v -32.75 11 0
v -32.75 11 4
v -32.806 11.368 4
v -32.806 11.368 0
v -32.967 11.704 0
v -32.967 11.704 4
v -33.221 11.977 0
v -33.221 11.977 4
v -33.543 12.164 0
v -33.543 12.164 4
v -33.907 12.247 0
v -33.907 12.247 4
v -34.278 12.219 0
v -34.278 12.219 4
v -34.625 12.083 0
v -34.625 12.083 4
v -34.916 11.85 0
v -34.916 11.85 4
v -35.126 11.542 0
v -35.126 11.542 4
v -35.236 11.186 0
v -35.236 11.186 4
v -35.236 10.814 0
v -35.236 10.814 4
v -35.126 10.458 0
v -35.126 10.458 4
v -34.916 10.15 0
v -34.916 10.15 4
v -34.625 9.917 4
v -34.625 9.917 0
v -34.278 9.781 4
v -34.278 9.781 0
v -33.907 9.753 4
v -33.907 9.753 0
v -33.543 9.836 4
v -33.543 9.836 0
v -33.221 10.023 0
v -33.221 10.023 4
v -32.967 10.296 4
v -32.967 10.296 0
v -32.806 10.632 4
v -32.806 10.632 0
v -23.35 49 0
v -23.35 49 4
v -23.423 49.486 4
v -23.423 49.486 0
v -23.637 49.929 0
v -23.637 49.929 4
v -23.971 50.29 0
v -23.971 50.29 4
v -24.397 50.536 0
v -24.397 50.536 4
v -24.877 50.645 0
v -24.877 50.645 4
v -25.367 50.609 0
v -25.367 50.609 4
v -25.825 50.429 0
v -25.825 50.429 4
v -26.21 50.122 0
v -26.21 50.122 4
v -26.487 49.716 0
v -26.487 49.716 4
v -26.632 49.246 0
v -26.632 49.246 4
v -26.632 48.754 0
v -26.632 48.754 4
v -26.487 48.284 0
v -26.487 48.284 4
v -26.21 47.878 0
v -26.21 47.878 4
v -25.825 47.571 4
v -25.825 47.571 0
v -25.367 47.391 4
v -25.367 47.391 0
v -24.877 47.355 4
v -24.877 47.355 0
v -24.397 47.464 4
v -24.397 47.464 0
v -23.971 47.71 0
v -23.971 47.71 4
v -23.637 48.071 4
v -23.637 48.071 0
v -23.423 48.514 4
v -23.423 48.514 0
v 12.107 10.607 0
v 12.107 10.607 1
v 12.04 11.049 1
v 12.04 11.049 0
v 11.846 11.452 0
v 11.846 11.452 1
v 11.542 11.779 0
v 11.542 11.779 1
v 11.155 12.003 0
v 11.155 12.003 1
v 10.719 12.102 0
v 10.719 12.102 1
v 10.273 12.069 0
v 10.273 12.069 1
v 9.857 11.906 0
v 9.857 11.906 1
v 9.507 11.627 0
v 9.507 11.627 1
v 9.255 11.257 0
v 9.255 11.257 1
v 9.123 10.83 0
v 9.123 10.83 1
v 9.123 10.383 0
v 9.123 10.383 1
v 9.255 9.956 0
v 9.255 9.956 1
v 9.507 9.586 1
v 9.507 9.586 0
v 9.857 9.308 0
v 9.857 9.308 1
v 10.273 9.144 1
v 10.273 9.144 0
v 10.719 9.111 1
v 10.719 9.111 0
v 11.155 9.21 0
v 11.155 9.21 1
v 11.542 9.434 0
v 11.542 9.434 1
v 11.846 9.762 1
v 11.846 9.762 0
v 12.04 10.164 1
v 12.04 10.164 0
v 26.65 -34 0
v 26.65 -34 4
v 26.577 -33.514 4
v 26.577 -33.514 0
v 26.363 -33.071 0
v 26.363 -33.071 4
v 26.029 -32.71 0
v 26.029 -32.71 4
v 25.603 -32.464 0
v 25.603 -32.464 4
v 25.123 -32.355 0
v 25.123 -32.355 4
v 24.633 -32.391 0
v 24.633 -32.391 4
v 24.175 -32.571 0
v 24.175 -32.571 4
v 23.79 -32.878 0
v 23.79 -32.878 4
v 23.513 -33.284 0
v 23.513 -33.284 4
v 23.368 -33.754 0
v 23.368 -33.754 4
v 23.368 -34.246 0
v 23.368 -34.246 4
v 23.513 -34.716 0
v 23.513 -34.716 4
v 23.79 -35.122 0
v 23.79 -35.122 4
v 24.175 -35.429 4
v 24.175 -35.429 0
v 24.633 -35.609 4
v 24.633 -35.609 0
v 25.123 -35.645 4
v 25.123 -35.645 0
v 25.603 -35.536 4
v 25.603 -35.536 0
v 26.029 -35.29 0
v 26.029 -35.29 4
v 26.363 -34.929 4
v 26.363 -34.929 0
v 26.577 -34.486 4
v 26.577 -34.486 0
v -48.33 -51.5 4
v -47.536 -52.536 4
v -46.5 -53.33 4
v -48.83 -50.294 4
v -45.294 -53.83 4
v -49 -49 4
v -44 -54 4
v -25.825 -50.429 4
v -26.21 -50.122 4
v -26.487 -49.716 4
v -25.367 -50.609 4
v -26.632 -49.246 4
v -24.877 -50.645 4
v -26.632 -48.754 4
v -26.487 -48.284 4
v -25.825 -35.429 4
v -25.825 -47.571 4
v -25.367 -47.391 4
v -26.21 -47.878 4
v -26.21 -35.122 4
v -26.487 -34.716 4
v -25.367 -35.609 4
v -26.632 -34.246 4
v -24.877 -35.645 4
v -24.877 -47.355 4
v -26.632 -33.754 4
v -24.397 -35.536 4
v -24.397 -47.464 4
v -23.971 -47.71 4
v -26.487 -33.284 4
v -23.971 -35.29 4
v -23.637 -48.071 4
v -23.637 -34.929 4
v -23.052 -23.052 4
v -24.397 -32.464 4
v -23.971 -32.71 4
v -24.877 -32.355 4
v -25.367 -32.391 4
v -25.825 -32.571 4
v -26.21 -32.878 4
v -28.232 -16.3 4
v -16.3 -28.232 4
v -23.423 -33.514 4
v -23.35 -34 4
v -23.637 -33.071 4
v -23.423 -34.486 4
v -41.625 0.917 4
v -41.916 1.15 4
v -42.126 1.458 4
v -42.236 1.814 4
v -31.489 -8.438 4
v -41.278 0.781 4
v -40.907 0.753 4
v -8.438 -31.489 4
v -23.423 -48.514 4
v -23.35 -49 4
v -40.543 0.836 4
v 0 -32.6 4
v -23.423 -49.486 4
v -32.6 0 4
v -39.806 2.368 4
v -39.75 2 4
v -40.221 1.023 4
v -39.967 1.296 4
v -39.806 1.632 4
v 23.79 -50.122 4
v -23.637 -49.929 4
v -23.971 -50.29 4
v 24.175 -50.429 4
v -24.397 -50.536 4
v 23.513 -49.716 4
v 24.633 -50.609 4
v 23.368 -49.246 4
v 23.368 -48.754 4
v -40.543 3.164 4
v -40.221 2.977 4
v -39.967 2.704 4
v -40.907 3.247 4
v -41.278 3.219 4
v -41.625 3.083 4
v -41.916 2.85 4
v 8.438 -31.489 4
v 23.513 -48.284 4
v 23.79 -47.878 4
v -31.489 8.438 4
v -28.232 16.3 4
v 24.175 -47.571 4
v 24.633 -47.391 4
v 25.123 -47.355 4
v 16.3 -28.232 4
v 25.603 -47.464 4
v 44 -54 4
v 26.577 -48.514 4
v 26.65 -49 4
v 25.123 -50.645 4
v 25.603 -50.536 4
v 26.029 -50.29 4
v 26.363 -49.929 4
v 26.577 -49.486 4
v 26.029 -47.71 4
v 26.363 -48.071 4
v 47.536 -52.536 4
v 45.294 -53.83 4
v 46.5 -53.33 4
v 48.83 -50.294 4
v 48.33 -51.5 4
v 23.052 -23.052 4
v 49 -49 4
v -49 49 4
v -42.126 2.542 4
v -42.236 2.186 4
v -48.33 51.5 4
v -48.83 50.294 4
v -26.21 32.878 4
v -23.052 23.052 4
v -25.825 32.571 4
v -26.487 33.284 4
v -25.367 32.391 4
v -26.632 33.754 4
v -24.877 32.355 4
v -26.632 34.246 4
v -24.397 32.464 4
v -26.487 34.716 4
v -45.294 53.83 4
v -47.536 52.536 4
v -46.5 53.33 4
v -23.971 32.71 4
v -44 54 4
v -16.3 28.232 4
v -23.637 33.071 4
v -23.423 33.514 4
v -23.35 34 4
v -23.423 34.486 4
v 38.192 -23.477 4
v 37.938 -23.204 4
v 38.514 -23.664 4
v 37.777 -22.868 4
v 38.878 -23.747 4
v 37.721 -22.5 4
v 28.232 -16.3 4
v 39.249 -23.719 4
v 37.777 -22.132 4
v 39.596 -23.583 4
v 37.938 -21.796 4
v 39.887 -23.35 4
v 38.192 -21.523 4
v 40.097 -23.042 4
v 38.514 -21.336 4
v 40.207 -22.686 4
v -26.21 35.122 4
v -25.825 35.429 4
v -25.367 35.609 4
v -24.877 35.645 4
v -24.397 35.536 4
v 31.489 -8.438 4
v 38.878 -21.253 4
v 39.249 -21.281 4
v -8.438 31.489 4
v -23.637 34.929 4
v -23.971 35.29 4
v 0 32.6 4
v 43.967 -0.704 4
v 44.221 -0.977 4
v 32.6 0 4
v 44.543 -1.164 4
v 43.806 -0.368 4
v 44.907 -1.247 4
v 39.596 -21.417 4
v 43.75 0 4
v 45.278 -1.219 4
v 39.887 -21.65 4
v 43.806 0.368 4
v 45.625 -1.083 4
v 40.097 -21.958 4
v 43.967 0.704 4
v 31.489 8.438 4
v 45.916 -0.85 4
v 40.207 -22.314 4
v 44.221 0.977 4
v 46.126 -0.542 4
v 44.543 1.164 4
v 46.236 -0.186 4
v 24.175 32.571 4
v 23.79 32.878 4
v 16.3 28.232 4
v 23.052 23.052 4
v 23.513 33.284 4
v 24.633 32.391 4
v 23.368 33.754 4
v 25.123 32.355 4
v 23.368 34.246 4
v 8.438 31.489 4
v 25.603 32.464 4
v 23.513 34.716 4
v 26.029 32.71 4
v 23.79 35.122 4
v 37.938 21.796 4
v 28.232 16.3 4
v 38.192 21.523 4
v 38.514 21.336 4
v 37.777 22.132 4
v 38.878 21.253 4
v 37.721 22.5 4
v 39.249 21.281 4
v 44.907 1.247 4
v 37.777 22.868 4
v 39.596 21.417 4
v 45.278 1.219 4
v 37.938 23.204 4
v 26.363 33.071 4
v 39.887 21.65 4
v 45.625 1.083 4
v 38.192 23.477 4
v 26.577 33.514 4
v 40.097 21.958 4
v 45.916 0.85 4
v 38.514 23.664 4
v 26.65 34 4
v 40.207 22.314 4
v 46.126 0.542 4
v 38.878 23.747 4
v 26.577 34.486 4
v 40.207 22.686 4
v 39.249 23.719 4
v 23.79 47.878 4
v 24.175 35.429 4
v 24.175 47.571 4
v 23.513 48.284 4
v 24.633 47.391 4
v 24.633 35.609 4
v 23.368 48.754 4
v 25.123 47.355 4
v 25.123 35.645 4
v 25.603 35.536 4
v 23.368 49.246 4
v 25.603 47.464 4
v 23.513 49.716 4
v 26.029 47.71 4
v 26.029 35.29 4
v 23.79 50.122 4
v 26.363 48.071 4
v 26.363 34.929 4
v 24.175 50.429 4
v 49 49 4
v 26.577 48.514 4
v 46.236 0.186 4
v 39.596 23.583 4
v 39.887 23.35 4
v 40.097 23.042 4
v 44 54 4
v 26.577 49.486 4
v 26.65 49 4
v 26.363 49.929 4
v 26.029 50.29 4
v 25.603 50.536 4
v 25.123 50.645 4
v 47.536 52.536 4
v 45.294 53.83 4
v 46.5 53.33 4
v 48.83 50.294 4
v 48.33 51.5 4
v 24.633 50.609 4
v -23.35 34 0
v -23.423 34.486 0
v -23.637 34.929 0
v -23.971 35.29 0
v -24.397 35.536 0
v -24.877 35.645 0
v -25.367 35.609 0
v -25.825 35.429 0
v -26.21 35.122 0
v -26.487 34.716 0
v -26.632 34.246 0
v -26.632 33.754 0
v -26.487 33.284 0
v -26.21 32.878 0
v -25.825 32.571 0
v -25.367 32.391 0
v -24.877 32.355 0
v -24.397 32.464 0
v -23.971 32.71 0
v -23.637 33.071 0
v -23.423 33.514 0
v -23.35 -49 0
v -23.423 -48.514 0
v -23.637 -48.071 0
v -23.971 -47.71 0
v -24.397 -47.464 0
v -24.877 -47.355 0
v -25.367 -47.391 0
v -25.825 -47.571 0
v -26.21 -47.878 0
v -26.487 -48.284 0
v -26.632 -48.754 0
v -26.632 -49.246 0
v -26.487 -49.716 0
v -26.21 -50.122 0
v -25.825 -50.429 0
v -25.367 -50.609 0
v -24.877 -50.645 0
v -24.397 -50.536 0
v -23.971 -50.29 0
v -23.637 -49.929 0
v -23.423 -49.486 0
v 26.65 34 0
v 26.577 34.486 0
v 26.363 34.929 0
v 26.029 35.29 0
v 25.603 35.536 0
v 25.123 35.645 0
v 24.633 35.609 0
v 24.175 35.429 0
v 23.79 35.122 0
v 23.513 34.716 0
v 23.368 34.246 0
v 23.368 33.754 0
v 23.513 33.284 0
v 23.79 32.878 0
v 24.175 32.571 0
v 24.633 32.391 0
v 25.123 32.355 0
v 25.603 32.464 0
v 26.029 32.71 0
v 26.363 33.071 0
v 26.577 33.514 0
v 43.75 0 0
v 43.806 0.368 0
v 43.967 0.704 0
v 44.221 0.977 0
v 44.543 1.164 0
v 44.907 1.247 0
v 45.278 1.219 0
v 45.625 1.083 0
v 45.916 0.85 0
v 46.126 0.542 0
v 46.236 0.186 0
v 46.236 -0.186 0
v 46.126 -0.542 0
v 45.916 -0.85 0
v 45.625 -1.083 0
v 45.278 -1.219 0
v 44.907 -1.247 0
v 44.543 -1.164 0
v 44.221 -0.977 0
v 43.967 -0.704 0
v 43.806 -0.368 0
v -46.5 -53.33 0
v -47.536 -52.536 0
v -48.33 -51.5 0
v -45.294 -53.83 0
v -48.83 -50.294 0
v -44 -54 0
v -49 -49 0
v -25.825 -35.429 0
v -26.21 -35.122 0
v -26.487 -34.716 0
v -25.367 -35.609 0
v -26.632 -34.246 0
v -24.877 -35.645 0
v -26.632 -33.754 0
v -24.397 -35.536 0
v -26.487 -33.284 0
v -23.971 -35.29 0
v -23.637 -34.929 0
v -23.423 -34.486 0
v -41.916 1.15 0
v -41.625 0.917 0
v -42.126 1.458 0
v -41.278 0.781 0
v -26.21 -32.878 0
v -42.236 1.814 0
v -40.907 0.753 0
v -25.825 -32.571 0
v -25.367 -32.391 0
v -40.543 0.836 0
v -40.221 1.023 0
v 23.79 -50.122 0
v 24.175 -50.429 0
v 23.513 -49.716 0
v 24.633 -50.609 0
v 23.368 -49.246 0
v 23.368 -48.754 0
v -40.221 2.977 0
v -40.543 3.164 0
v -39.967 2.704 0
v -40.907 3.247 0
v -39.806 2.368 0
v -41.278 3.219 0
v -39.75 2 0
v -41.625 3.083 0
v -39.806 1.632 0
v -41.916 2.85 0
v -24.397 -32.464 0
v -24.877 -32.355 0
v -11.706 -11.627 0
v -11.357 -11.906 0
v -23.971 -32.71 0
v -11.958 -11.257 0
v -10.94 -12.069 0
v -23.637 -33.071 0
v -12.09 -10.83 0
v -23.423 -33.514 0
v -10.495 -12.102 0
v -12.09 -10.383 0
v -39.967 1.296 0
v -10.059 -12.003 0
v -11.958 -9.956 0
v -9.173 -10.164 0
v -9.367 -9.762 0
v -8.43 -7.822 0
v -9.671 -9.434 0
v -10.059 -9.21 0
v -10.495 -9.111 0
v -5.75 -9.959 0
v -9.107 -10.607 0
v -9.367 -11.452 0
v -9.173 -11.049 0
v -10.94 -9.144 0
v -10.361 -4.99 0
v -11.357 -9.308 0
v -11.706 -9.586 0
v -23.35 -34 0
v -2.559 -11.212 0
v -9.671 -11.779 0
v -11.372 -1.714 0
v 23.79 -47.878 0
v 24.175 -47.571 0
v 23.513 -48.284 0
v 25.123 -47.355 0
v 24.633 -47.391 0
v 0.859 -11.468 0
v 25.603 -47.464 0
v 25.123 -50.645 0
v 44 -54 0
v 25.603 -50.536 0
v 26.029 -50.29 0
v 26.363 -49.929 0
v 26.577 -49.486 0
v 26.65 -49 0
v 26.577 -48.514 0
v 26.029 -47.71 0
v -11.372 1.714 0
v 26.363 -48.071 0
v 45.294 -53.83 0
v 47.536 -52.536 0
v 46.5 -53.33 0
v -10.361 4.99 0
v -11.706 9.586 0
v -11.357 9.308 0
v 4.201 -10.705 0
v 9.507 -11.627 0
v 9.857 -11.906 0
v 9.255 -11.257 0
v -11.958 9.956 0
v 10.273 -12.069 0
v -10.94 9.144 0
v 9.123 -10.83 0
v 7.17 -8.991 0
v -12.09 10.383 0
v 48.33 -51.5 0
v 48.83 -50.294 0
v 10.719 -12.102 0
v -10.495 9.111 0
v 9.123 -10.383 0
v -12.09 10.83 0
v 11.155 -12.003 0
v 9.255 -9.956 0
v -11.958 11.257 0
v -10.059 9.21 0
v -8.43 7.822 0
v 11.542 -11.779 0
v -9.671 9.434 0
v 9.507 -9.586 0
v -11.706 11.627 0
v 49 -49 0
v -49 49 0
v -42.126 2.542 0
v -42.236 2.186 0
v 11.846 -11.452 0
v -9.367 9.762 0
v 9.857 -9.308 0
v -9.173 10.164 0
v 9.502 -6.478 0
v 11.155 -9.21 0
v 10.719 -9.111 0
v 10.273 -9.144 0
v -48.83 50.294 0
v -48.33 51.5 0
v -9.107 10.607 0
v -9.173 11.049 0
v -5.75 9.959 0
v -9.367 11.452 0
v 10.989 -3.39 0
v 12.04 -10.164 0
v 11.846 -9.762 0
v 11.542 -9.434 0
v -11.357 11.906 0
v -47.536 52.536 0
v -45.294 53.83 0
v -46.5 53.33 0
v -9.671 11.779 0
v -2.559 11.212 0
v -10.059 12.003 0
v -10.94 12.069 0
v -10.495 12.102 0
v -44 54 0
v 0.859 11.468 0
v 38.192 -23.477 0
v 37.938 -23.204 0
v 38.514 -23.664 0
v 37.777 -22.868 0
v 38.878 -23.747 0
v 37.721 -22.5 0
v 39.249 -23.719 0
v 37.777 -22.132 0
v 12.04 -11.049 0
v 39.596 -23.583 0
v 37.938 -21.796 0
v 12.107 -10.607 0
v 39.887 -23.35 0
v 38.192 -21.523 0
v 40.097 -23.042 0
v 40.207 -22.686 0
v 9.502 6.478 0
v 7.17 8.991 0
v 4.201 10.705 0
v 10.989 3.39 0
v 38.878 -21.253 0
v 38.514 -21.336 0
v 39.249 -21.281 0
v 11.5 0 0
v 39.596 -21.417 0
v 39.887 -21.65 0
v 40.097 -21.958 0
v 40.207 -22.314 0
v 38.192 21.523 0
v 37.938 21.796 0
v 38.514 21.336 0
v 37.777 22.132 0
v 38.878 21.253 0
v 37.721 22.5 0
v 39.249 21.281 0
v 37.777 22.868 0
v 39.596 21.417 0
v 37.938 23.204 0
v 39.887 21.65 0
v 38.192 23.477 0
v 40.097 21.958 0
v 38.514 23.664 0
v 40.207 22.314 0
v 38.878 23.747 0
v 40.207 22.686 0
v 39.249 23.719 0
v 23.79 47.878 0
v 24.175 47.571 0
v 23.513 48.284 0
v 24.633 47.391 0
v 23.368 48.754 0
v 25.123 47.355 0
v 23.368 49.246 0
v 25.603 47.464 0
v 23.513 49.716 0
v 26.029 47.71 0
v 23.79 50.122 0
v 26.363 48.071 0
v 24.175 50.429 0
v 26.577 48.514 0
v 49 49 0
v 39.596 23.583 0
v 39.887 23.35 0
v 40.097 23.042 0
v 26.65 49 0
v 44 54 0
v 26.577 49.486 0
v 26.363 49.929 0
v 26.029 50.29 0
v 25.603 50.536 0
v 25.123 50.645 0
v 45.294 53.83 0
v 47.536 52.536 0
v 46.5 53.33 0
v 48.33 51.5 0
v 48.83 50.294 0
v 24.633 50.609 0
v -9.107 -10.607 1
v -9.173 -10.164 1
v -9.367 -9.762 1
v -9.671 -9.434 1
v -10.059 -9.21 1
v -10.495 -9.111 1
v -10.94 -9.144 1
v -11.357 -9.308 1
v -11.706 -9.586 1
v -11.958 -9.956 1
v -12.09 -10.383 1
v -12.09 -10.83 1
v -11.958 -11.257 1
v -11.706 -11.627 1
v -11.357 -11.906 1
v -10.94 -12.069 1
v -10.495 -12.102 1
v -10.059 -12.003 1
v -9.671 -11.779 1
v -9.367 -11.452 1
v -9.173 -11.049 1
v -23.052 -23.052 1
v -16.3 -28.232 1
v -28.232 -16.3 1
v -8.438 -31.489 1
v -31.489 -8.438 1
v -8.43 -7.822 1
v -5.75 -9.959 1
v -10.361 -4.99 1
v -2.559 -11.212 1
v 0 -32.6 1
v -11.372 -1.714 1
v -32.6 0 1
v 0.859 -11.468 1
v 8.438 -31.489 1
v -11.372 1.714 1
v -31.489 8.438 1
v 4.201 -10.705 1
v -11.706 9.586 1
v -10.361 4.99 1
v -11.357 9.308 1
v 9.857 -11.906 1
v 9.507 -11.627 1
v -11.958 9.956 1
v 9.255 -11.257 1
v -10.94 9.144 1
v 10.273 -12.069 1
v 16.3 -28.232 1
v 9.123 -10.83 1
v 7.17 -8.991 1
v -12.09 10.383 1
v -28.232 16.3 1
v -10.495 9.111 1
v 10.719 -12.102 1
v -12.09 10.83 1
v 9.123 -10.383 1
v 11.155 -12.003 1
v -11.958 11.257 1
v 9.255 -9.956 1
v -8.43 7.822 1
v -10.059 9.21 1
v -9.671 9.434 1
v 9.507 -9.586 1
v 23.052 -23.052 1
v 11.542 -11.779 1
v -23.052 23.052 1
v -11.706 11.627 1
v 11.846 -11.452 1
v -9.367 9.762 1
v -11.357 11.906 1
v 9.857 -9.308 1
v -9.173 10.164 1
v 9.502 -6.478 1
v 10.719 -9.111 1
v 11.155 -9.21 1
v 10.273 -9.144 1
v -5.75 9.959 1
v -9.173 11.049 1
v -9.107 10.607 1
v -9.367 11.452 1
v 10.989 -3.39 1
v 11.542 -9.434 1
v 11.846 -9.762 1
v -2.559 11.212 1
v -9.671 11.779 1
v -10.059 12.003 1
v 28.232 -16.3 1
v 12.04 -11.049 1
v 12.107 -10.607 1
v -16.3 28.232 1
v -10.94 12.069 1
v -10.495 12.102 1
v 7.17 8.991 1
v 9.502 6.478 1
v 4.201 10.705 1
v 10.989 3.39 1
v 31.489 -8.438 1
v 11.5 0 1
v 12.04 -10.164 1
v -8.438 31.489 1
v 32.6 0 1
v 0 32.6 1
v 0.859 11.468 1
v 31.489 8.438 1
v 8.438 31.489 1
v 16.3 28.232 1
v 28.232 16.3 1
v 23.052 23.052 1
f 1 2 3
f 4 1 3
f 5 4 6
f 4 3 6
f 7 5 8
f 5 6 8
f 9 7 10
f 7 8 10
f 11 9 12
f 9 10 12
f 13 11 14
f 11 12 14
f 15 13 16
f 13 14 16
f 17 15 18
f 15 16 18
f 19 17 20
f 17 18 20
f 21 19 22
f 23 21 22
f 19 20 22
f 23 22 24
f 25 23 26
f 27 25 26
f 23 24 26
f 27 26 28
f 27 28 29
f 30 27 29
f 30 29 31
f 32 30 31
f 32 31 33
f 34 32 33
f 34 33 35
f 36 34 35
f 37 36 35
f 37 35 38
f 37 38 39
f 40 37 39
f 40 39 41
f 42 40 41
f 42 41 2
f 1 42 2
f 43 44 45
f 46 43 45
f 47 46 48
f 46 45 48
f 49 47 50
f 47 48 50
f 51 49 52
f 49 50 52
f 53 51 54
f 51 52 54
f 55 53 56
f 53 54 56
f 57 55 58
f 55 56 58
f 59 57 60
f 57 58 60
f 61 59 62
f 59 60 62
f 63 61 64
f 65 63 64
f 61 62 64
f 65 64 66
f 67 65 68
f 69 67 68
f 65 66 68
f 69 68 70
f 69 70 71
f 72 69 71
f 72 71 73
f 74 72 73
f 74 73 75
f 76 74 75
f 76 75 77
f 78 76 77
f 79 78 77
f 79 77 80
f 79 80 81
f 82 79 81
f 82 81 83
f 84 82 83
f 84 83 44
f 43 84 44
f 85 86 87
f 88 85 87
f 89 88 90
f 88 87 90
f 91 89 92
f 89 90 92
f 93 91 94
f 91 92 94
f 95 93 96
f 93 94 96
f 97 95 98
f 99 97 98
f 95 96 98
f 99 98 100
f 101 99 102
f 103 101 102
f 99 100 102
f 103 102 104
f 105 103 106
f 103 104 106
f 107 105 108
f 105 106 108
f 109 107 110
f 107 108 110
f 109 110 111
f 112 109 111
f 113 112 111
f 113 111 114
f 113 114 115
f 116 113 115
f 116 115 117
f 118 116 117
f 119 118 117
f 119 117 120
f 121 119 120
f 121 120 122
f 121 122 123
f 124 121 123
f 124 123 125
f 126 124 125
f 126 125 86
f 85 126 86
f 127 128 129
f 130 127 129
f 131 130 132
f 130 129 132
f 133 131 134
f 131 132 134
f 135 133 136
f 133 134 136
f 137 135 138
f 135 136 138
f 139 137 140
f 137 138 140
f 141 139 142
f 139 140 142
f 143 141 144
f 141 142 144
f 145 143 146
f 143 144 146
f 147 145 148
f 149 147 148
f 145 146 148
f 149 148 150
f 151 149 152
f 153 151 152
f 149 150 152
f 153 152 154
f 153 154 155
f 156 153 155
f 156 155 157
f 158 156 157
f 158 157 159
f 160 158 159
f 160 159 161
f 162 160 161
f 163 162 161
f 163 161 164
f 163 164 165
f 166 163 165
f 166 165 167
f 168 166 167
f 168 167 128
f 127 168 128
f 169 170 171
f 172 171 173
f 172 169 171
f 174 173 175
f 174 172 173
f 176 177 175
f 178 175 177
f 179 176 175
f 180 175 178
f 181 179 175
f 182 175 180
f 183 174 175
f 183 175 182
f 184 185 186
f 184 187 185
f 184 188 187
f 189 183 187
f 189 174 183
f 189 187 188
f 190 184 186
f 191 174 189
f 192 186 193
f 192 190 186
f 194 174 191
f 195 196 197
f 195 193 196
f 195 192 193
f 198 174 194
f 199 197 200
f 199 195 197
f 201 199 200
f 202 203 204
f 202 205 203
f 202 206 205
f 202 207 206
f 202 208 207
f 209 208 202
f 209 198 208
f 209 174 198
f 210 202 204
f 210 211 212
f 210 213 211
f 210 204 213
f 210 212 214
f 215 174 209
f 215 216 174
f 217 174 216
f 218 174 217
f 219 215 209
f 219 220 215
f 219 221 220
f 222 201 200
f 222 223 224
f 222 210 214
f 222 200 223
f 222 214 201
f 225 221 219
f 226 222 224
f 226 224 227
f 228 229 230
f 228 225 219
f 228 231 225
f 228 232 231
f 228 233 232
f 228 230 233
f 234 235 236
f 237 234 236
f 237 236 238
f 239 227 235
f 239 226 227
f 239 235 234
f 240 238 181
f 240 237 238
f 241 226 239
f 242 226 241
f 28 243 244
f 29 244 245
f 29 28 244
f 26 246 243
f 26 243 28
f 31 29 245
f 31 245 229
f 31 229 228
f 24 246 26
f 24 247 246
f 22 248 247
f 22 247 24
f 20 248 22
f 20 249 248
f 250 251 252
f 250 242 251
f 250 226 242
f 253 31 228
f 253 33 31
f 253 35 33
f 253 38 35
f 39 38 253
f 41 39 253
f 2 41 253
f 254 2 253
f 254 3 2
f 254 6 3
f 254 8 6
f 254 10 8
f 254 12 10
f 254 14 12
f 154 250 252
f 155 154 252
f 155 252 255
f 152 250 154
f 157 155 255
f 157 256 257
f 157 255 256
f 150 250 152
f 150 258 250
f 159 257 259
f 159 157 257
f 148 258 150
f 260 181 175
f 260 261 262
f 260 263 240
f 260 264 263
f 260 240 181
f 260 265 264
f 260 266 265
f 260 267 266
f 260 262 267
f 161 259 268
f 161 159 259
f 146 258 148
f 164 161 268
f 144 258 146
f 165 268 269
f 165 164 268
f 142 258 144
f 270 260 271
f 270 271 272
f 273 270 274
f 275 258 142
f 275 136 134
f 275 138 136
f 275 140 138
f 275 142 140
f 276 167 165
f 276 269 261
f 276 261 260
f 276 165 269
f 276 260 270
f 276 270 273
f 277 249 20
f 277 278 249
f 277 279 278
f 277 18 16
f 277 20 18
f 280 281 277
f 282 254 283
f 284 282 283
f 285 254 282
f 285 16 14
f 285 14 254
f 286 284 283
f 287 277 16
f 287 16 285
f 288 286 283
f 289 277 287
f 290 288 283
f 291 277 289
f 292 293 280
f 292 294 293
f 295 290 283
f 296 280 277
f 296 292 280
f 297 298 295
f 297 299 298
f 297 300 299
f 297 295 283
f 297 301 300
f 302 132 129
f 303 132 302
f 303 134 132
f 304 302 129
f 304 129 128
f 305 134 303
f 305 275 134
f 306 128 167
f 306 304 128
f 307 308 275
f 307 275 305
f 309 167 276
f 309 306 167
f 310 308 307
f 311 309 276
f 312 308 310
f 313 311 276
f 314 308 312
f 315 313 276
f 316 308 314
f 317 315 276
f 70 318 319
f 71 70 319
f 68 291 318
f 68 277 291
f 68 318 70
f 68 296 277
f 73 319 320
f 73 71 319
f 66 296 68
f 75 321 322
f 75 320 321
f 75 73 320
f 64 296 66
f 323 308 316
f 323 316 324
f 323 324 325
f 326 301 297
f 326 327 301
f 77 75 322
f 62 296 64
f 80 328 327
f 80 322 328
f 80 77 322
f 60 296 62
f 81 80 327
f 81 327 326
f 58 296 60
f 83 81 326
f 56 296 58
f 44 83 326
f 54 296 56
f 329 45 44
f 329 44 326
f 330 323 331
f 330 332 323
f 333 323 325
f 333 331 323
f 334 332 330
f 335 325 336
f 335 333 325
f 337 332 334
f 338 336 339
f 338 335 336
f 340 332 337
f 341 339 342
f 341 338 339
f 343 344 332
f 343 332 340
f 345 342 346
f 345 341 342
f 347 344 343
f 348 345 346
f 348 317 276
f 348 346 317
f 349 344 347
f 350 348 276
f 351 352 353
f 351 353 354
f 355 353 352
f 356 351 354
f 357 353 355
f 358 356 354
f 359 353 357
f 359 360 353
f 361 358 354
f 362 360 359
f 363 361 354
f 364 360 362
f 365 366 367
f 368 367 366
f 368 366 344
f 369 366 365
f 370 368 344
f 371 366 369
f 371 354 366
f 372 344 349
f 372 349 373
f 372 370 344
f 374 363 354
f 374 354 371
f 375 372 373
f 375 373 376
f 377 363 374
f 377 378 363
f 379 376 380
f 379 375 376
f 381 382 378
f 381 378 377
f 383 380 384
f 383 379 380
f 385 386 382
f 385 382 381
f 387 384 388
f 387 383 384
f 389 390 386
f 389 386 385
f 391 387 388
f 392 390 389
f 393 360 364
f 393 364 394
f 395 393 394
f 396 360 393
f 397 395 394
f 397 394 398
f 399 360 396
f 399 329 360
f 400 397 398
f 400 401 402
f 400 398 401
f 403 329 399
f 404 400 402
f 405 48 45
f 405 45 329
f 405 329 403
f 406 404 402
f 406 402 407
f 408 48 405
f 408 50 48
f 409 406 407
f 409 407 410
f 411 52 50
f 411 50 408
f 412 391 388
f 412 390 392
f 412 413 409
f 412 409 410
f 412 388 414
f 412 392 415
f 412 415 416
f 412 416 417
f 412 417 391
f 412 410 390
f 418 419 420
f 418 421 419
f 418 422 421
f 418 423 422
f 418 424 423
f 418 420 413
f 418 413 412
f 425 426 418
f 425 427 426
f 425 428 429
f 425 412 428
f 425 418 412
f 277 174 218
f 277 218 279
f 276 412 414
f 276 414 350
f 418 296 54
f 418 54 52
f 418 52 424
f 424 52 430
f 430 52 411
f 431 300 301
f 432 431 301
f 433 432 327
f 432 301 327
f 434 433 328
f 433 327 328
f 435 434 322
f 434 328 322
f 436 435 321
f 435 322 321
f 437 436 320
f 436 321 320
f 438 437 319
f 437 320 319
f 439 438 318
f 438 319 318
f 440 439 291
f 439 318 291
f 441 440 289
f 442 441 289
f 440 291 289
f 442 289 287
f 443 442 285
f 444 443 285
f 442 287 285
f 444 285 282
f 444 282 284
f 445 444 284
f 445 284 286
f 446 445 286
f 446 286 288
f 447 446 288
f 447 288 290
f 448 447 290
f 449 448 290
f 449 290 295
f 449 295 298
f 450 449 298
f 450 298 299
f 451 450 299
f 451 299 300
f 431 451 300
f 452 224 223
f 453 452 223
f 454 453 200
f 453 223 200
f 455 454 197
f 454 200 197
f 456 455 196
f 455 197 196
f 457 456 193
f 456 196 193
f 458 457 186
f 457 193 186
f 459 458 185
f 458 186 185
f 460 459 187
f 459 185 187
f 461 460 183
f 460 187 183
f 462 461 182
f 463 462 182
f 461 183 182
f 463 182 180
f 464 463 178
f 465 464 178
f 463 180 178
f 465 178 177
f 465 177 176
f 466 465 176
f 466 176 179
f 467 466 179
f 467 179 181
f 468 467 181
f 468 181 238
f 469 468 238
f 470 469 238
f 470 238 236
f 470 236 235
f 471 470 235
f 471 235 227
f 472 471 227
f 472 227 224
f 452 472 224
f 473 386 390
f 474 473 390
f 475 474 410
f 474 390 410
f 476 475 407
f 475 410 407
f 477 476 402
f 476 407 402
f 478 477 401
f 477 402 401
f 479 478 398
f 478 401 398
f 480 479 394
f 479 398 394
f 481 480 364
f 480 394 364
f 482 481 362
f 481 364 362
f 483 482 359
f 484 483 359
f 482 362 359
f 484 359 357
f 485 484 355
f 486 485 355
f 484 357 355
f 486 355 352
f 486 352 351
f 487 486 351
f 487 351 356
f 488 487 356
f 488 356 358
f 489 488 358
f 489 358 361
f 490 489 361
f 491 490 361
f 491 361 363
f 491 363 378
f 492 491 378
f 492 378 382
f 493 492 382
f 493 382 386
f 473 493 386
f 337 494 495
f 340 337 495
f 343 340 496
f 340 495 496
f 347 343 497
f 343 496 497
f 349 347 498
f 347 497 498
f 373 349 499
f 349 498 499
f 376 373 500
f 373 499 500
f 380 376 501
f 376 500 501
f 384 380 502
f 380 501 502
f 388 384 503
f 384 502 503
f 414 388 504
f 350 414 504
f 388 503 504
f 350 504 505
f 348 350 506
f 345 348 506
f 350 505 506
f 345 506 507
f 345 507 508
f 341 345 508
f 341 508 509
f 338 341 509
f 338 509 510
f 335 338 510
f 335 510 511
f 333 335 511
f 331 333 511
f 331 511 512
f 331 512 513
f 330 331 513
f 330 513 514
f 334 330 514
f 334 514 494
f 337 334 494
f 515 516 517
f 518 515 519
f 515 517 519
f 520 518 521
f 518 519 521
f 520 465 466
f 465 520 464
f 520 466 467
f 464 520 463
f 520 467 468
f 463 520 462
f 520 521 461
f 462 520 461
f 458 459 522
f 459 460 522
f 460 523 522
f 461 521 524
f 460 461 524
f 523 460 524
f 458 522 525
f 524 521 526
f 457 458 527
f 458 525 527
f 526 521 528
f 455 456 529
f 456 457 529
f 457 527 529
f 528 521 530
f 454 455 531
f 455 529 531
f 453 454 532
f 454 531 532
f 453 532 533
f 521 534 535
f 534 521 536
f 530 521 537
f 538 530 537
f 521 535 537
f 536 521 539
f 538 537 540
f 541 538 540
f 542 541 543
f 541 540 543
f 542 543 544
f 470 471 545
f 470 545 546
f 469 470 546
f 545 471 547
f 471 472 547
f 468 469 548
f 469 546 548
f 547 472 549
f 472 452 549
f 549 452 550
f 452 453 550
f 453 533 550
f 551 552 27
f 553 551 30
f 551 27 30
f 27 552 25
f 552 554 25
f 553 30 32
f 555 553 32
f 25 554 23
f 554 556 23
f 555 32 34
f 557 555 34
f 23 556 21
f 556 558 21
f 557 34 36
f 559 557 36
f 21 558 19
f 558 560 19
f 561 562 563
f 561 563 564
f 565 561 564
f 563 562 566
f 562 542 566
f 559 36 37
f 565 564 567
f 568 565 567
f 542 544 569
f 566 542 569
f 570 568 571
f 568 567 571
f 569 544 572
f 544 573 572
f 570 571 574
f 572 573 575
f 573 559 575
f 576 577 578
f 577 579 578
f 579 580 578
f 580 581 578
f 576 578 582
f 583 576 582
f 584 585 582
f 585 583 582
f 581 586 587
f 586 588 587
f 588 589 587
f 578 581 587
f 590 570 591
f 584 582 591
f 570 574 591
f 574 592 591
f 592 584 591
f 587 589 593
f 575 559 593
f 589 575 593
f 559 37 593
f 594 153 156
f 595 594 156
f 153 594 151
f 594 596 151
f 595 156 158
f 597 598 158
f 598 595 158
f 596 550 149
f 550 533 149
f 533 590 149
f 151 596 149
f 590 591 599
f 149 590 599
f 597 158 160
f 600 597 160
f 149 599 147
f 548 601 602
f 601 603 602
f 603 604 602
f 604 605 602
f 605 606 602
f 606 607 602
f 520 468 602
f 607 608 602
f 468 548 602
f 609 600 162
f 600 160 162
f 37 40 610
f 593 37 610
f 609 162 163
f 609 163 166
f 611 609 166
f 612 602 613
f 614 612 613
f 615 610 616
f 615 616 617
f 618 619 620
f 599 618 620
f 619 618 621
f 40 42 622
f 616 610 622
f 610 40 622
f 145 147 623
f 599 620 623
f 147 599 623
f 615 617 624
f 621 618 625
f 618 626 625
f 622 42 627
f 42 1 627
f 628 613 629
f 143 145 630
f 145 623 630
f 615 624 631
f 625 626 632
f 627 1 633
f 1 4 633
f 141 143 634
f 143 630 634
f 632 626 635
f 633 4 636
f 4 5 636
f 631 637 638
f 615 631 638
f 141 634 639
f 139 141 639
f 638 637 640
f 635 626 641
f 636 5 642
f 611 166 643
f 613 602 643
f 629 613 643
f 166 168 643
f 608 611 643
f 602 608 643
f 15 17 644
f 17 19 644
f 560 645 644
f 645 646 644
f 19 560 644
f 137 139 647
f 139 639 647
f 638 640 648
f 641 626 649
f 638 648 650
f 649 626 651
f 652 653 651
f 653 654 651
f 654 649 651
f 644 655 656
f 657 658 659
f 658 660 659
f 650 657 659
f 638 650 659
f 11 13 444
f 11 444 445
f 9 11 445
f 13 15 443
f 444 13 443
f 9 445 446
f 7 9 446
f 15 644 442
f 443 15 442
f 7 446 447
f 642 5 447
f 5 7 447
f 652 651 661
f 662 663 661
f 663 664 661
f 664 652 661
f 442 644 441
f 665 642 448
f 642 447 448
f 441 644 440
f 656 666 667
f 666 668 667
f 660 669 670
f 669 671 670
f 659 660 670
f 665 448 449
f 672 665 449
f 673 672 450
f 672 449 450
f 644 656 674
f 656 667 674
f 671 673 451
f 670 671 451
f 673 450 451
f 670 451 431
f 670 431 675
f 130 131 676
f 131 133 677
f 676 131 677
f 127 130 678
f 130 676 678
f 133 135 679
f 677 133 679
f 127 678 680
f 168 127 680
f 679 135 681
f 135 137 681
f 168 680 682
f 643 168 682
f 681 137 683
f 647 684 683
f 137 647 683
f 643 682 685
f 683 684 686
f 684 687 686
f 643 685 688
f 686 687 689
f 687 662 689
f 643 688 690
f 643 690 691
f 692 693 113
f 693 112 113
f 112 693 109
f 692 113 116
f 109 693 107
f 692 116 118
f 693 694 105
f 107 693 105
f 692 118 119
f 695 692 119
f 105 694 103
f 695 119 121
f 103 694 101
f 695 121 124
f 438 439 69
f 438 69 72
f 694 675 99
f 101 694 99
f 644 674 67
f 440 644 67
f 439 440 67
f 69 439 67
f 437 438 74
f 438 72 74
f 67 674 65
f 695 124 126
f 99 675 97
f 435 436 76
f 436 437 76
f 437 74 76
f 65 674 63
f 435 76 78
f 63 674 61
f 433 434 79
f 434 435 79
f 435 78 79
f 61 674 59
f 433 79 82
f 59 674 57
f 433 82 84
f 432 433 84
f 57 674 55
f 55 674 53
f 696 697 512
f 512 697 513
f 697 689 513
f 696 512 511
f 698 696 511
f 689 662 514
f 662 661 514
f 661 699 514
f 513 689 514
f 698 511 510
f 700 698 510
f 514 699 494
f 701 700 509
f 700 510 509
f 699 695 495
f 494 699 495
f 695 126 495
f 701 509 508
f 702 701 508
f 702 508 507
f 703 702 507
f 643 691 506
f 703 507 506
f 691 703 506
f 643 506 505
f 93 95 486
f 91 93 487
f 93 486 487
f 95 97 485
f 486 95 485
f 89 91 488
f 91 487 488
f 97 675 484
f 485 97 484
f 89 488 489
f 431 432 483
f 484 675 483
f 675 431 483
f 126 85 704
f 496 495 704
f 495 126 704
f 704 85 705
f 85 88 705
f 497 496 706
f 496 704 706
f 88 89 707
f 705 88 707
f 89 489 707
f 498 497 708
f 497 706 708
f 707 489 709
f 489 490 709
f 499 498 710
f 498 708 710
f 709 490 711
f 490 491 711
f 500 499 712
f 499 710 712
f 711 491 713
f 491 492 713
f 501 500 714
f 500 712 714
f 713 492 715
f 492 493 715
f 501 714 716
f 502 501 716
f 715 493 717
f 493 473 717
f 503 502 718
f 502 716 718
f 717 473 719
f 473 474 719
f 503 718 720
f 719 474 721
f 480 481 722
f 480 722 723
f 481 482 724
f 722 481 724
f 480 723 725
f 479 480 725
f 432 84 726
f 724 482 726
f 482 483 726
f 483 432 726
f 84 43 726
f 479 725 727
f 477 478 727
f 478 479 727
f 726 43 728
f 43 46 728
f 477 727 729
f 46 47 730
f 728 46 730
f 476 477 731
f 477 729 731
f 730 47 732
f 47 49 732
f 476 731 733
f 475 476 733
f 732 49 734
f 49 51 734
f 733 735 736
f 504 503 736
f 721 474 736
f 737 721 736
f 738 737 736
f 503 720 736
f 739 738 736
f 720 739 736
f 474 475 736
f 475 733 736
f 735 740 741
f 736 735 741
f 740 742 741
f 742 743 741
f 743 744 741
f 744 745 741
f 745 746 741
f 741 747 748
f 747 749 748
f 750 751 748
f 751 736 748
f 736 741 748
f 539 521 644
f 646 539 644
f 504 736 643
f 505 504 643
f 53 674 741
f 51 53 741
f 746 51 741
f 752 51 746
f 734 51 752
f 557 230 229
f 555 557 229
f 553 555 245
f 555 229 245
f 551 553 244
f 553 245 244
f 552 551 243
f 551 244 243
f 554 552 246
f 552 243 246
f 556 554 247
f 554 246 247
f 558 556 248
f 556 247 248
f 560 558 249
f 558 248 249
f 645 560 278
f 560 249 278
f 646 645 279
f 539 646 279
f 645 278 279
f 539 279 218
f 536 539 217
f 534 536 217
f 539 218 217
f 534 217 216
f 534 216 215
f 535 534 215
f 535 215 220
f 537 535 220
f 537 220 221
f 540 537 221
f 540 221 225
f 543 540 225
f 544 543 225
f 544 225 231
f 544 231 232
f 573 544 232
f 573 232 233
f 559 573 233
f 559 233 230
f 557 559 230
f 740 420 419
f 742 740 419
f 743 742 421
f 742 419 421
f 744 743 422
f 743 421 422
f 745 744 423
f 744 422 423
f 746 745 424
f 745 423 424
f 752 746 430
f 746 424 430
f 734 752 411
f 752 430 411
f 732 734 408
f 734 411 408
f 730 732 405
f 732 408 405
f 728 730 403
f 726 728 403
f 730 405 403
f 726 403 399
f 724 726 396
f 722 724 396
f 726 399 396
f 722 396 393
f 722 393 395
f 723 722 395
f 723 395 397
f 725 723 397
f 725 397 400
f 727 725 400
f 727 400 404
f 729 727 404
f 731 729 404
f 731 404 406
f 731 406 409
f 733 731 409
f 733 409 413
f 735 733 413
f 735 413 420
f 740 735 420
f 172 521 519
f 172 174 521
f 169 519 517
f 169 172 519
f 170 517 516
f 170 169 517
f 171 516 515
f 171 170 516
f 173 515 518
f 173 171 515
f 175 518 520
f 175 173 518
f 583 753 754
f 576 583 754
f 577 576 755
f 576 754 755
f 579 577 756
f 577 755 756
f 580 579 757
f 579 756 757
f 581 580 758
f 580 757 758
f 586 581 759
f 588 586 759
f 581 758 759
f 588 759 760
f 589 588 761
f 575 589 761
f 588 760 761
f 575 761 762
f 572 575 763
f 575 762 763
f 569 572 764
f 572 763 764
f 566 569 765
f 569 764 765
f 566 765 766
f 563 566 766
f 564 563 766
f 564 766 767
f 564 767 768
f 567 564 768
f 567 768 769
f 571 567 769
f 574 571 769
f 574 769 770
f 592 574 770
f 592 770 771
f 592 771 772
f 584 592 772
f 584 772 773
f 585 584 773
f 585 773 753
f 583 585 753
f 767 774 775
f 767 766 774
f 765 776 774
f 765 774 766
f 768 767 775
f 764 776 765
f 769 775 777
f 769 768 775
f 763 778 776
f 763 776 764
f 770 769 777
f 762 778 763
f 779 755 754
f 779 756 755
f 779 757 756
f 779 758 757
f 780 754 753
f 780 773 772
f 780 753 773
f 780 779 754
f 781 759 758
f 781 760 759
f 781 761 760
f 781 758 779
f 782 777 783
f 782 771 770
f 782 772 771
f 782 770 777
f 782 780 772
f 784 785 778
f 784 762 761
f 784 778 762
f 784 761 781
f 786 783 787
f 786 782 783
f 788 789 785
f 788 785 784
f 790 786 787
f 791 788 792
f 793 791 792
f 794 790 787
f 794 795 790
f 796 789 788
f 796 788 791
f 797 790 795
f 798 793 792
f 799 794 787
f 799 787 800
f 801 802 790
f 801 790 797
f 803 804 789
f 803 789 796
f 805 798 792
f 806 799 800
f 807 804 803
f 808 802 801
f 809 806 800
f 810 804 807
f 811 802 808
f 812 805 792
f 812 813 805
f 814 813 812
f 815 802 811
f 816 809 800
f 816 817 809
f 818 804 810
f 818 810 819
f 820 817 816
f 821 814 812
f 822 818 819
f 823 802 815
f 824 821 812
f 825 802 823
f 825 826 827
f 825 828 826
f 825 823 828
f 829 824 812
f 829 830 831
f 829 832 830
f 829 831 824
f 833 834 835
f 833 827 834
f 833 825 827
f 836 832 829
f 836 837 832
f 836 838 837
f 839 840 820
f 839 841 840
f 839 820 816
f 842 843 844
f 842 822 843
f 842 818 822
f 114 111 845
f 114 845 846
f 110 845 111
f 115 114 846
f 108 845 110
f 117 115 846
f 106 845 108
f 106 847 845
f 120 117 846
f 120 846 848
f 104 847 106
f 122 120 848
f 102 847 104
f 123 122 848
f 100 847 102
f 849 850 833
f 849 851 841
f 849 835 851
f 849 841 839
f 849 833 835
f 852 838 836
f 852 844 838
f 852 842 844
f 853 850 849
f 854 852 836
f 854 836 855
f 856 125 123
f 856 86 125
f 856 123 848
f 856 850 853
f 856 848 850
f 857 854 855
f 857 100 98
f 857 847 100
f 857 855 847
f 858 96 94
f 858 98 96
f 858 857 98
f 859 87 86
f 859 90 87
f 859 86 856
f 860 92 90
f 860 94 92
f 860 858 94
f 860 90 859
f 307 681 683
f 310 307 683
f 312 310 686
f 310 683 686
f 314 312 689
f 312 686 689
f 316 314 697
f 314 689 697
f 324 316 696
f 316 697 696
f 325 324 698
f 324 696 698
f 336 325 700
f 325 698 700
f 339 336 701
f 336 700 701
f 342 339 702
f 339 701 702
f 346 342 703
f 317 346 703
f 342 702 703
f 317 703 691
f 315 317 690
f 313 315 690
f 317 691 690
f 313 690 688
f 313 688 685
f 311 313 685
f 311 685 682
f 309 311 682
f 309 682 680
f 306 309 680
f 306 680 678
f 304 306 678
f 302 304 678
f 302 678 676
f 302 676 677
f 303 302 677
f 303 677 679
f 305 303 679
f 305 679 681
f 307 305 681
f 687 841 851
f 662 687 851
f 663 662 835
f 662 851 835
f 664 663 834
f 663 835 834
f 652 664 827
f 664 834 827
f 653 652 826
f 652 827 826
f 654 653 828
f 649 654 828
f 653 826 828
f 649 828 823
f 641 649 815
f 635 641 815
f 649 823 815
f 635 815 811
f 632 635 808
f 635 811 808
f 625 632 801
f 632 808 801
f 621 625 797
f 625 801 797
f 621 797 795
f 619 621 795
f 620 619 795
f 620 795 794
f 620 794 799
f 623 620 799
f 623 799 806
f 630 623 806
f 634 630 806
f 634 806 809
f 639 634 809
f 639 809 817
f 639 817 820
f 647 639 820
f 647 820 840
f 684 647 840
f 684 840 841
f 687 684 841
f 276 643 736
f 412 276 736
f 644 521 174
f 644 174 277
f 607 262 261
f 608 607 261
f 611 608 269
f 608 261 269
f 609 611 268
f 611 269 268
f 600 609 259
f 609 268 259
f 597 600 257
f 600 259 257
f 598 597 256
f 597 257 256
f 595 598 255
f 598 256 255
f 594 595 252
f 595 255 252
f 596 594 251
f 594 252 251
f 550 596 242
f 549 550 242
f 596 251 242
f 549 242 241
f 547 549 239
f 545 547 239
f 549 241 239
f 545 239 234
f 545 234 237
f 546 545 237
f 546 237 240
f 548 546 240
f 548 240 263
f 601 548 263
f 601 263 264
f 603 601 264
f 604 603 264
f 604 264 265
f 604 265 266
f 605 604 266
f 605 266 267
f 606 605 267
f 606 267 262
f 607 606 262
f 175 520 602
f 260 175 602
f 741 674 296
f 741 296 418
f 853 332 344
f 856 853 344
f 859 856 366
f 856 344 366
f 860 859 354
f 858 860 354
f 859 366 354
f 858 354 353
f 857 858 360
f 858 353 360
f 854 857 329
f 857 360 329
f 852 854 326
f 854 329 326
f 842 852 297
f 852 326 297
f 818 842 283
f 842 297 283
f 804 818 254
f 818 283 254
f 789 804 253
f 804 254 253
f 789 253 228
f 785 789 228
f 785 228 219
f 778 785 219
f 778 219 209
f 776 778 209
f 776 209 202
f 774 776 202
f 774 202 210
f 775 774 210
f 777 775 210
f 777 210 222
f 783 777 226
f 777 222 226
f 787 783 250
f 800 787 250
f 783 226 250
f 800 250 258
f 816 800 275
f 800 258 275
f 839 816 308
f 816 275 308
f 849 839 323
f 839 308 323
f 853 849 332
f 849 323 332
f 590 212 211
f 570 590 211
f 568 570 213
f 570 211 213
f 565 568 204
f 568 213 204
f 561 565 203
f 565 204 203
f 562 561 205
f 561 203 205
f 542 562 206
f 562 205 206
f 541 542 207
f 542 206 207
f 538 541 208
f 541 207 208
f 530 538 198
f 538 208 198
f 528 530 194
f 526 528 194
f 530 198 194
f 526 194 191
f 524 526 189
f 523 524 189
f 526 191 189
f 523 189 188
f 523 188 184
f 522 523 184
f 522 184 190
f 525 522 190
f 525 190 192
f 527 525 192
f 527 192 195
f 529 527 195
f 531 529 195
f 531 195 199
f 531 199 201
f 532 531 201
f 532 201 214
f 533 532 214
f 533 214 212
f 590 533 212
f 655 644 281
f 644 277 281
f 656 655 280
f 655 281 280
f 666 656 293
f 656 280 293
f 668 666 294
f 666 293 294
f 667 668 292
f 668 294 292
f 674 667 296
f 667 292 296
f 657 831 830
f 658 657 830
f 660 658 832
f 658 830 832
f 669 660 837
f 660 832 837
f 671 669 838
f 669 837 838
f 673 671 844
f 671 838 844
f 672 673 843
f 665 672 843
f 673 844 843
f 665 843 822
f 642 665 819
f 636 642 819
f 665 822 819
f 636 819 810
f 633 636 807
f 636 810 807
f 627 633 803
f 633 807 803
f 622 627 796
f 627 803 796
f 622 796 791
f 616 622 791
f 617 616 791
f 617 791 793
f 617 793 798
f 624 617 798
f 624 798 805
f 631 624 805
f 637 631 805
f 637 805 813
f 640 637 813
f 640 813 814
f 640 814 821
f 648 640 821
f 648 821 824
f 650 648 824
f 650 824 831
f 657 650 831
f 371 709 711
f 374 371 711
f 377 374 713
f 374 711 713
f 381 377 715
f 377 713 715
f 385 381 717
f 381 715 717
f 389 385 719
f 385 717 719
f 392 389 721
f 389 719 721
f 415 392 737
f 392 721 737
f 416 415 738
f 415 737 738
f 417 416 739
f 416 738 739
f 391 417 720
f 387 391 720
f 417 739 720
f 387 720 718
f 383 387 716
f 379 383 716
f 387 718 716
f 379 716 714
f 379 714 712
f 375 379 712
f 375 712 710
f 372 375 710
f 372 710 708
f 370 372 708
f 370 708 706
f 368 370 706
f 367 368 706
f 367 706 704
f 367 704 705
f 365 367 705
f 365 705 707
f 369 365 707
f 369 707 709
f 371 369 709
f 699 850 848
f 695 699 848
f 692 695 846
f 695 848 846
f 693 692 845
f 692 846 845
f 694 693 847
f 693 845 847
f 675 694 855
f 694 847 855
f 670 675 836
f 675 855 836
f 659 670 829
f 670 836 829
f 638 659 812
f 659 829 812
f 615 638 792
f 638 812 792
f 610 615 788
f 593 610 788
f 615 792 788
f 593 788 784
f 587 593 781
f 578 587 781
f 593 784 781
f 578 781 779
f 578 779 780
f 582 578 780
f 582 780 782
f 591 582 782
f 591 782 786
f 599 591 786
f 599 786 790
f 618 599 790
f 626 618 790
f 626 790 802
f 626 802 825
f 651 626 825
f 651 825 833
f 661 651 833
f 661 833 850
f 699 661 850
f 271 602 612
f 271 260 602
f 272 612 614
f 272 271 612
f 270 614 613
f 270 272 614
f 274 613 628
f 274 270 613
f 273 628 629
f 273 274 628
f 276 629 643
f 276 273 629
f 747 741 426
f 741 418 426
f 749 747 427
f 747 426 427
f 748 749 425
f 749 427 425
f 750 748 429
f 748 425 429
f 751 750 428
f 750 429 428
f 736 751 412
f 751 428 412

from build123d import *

# Parameters (mm, degrees)
SKETCH_1_W             = 98
SKETCH_1_H             = 108
EXTRUDE_1_DEPTH        = 4
SKETCH_2_R             = 11.5
CUT_EXTRUDE_1_DEPTH    = 10
SKETCH_3_R             = 32.6
CUT_EXTRUDE_2_DEPTH    = 3
SKETCH_4_R             = 1.5
CUT_EXTRUDE_3_DEPTH    = 2
FILLET_1_R             = 5
HOLE_WIZARD_M4_1_D     = 3.3
HOLE_WIZARD_M4_1_DEPTH = 10.1
HOLE_WIZARD_M4_1_TIP   = 0.991420021
HOLE_WIZARD_M3_1_D     = 2.5
HOLE_WIZARD_M3_1_DEPTH = 7.5
HOLE_WIZARD_M3_1_TIP   = 0.751075774
HOLE_WIZARD_M3_2_D     = 2.5
HOLE_WIZARD_M3_2_DEPTH = 7.5
HOLE_WIZARD_M3_2_TIP   = 0.751075774


with BuildPart() as part:
    # 草图1 → 凸台-拉伸1 (new body)
    with BuildSketch(Plane.XY):
        Rectangle(SKETCH_1_W, SKETCH_1_H)
    extrude(amount=EXTRUDE_1_DEPTH)

    # 草图2 → 切除-拉伸1 (cut)
    with BuildSketch(Plane.XY.offset(4)):
        Circle(SKETCH_2_R)
    extrude(amount=-CUT_EXTRUDE_1_DEPTH, mode=Mode.SUBTRACT)

    # 草图3 → 切除-拉伸2 (cut)
    with BuildSketch(Plane.XY.offset(4)):
        Circle(SKETCH_3_R)
    extrude(amount=-CUT_EXTRUDE_2_DEPTH, mode=Mode.SUBTRACT)

    # 草图4 → 切除-拉伸3 (cut)
    with BuildSketch(Plane.XY.offset(1)):
        with Locations((-10.606601718, 10.606601718)):
            Circle(SKETCH_4_R)
        with Locations((10.606601718, -10.606601718)):
            Circle(SKETCH_4_R)
        with Locations((10.606601718, 10.606601718)):
            Circle(SKETCH_4_R)
        with Locations((-10.606601718, -10.606601718)):
            Circle(SKETCH_4_R)
    extrude(amount=-CUT_EXTRUDE_3_DEPTH, mode=Mode.SUBTRACT)

    # 圆角1
    fillet_1_edges = [part.edges().sort_by_distance(p)[0] for p in [
        (-49, 54, 2),
        (49, 54, 2),
        (49, -54, 2),
        (-49, -54, 2),
    ]]
    fillet(fillet_1_edges, radius=FILLET_1_R)

    # M4 螺纹孔1
    with Locations(Plane(origin=(0, 0, 0), x_dir=(-1, 0, 0), z_dir=(0, 0, -1))):
        with Locations((-25, 49), (-25, 34), (25, 34), (25, 49), (-25, -34), (-25, -49), (25, -49), (25, -34)):
            Hole(HOLE_WIZARD_M4_1_D / 2, depth=HOLE_WIZARD_M4_1_DEPTH)
            with Locations((0, 0, -(HOLE_WIZARD_M4_1_DEPTH + HOLE_WIZARD_M4_1_TIP / 2))):  # 118° drill point
                Cone(0, HOLE_WIZARD_M4_1_D / 2, HOLE_WIZARD_M4_1_TIP, mode=Mode.SUBTRACT)

    # M3 螺纹孔1
    with Locations(Plane(origin=(0, 0, 0), x_dir=(-1, 0, 0), z_dir=(0, 0, -1))):
        with Locations((41, 2), (34, 11)):
            Hole(HOLE_WIZARD_M3_1_D / 2, depth=HOLE_WIZARD_M3_1_DEPTH)
            with Locations((0, 0, -(HOLE_WIZARD_M3_1_DEPTH + HOLE_WIZARD_M3_1_TIP / 2))):  # 118° drill point
                Cone(0, HOLE_WIZARD_M3_1_D / 2, HOLE_WIZARD_M3_1_TIP, mode=Mode.SUBTRACT)

    # M3 螺纹孔2
    with Locations(Plane.XY.offset(4)):
        with Locations((38.97114317, 22.5), (45, 0), (38.97114317, -22.5)):
            Hole(HOLE_WIZARD_M3_2_D / 2, depth=HOLE_WIZARD_M3_2_DEPTH)
            with Locations((0, 0, -(HOLE_WIZARD_M3_2_DEPTH + HOLE_WIZARD_M3_2_TIP / 2))):  # 118° drill point
                Cone(0, HOLE_WIZARD_M3_2_D / 2, HOLE_WIZARD_M3_2_TIP, mode=Mode.SUBTRACT)


solid = part.part
